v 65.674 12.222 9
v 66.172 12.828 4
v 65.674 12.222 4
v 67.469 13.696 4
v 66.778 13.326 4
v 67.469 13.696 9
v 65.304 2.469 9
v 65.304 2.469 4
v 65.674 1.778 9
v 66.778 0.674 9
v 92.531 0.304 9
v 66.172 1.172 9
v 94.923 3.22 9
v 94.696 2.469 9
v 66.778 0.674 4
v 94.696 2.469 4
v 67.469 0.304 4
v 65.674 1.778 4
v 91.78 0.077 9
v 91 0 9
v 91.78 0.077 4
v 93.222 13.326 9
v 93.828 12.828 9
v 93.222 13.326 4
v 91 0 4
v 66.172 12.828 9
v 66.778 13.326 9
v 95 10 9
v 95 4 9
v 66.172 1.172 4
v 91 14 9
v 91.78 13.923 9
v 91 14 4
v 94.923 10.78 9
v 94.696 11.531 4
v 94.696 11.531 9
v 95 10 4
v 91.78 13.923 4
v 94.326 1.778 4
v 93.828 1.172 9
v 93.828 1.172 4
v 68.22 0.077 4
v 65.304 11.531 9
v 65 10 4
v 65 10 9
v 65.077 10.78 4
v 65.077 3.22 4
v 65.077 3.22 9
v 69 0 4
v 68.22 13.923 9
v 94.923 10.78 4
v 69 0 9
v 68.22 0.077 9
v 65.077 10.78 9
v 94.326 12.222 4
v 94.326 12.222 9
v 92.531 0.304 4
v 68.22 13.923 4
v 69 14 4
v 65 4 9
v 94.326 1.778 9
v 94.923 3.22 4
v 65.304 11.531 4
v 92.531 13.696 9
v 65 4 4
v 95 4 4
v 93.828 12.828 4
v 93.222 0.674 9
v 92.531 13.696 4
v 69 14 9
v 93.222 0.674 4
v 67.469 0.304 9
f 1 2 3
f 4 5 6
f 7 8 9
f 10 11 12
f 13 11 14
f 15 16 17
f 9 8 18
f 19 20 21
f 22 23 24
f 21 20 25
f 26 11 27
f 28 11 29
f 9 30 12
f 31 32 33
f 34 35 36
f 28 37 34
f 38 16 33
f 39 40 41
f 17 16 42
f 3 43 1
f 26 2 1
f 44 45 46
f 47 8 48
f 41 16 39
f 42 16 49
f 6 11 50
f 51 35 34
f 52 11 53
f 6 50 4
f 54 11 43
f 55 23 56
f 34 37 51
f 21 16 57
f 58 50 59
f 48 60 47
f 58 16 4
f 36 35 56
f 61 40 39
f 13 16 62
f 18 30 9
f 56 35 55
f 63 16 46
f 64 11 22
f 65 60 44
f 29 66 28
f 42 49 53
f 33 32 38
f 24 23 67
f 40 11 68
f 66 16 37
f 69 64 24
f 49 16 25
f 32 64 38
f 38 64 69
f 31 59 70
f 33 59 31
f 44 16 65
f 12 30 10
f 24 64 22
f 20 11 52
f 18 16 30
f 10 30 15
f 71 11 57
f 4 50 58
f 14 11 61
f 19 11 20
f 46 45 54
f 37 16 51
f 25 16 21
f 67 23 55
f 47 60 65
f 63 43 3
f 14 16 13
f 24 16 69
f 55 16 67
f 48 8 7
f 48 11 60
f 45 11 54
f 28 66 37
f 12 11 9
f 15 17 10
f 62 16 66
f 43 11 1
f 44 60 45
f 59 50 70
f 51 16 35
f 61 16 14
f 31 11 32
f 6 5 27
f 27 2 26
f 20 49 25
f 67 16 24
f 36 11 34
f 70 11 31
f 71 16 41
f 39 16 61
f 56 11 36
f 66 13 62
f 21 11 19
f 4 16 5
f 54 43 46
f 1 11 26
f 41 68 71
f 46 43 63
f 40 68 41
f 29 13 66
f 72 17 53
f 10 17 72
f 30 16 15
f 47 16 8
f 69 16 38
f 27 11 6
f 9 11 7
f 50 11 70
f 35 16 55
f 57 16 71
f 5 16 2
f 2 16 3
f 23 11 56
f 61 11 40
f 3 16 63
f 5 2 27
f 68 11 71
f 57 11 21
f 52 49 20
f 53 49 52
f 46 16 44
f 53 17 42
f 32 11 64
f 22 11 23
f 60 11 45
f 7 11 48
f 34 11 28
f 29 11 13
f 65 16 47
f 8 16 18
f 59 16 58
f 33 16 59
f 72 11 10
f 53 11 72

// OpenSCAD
// pull_tab.scad
// Small raised pull tab for a labeled storage-bin lid example (assembly
// part 3 of 3). Hand-authored for the ai-3d-factory examples/ library
// (examples/storage-bin-lid/). Shares the same origin as
// lid_panel.scad/raised_label.scad - do not re-center this part.
// Positioned centered along the front edge, so a hand can grip it to lift
// the lid off the bin. See docs/slicer-review-workflow.md.
//
// This repo does not run OpenSCAD automatically. Geometry sanity check
// passed does not mean print-ready - human slicer review is still
// required. See AGENT.md.

// ---- Shared parameters (all in millimeters) - keep in sync with lid_panel.scad and raised_label.scad ----
lid_width = 160;
lid_depth = 100;
lid_height = 4;

// ---- Pull-tab-only parameters ----
tab_width = 30;
tab_depth = 14;
tab_height = 5;          // how far the tab rises above the lid surface
tab_corner_radius = 4;

module pull_tab() {
    translate([lid_width / 2 - tab_width / 2, 0, lid_height])
        hull() {
            for (x = [tab_corner_radius, tab_width - tab_corner_radius])
                for (y = [tab_corner_radius, tab_depth - tab_corner_radius])
                    translate([x, y, 0])
                        cylinder(r = tab_corner_radius, h = tab_height, $fn = 32);
        }
}

pull_tab();
